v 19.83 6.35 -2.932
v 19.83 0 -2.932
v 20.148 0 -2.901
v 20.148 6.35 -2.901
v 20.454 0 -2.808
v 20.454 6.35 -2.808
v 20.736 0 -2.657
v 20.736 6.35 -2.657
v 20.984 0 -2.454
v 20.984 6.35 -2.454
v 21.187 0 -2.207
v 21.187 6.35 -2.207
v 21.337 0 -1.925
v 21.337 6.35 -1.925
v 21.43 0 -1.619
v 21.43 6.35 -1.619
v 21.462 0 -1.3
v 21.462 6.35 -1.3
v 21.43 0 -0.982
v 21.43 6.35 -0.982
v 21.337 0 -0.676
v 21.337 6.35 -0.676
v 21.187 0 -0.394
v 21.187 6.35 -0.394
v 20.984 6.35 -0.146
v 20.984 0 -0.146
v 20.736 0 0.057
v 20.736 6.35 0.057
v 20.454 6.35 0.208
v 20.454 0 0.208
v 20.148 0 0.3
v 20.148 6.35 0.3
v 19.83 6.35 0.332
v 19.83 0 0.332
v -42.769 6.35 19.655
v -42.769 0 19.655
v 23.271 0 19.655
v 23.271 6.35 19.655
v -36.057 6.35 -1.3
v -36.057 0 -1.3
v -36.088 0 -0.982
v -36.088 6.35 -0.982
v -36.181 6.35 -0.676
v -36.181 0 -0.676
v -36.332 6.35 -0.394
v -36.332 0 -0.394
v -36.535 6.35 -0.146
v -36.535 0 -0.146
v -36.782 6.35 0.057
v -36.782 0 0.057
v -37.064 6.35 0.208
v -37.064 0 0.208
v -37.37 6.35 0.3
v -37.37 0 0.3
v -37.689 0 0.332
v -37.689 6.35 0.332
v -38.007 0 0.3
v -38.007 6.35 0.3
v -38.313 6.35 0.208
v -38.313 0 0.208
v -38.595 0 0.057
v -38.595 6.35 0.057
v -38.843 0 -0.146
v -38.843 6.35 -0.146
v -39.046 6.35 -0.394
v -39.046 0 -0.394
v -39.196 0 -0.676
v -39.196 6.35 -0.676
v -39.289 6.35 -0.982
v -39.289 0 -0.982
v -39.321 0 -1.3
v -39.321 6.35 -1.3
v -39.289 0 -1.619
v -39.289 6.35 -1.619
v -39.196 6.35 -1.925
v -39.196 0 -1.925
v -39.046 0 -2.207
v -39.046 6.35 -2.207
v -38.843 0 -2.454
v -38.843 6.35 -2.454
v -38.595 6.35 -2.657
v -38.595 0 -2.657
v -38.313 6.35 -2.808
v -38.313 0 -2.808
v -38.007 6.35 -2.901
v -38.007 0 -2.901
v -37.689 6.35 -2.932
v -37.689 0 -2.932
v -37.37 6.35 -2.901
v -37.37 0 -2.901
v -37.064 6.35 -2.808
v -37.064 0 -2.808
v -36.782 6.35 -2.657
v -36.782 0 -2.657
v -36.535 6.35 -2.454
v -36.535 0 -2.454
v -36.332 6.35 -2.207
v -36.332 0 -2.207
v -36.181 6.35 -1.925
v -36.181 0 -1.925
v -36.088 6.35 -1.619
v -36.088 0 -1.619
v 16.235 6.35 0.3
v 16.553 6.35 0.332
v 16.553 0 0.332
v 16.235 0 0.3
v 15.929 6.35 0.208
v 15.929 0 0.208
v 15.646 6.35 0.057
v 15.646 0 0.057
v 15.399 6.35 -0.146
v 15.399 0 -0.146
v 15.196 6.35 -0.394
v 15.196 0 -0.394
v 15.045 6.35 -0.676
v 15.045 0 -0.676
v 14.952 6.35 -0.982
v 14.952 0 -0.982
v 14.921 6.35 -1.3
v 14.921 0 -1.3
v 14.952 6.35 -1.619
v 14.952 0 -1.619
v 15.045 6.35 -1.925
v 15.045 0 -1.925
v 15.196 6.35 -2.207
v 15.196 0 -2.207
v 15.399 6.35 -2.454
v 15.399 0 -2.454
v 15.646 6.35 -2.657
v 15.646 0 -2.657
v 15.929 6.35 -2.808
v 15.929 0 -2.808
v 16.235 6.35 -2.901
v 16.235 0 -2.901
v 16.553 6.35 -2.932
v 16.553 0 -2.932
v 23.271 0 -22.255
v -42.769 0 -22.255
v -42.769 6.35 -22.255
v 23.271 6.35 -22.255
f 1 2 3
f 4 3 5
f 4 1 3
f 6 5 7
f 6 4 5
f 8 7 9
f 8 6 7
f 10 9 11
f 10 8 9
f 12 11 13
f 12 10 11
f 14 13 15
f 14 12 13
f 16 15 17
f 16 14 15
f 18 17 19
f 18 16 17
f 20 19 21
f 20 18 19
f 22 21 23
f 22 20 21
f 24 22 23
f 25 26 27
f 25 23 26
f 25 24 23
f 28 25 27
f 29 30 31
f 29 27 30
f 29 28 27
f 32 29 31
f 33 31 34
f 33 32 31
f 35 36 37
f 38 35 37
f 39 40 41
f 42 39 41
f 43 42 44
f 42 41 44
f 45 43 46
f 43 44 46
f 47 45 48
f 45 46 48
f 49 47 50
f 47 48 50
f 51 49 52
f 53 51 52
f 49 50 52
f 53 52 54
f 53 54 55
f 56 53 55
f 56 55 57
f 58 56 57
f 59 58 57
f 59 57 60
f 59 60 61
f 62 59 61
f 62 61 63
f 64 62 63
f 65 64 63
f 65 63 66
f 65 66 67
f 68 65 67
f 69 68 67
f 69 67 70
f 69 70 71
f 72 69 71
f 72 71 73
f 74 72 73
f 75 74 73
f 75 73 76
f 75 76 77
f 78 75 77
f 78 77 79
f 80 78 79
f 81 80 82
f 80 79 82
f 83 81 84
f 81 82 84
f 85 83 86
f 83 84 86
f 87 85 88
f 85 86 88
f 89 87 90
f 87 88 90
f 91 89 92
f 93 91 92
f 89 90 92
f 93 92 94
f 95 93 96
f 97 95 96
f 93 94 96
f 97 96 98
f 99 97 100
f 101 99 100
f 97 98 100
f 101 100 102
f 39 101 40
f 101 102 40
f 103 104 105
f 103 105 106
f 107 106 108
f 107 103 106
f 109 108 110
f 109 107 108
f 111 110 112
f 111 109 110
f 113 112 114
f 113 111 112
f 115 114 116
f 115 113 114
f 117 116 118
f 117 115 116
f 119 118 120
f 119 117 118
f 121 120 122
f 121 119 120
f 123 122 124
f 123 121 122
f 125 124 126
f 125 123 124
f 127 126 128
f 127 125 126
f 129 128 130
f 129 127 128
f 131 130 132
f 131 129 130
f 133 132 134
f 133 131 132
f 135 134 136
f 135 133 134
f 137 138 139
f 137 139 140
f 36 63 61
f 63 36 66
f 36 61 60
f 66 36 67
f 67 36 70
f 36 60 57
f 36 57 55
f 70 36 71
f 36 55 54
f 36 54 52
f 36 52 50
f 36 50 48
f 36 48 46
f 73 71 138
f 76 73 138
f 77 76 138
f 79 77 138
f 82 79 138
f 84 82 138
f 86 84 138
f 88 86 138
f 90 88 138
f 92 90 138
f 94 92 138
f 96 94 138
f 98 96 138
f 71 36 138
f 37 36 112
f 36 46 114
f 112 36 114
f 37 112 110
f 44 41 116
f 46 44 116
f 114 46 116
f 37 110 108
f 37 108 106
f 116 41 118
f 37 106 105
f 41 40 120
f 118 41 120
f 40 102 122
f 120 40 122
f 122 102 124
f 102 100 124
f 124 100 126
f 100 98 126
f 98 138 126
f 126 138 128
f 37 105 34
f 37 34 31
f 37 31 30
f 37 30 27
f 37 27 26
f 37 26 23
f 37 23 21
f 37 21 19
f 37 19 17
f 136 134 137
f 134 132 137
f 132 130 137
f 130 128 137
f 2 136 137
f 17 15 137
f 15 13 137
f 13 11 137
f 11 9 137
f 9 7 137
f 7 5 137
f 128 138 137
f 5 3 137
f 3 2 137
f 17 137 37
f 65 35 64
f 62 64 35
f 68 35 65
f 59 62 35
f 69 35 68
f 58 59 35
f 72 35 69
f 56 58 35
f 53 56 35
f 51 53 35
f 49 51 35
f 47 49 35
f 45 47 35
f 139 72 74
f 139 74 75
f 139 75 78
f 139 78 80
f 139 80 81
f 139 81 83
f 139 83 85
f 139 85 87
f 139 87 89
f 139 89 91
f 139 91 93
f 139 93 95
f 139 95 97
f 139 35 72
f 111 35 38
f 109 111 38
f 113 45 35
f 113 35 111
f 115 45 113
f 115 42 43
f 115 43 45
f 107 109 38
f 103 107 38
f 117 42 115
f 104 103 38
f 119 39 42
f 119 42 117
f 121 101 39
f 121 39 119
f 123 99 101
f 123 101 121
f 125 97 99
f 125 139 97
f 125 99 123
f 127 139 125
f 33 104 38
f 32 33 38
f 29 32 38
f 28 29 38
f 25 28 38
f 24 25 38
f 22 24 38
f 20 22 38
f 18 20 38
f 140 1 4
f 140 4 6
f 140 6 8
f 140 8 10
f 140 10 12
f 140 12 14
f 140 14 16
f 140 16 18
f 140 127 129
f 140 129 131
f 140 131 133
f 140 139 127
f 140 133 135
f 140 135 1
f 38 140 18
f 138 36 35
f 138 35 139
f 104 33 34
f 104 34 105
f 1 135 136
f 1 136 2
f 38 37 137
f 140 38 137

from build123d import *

# Parameters (mm, degrees)
SKETCH1_W                 = 66.04
SKETCH1_H                 = 41.91
BOSS_EXTRUDE1_DEPTH       = 6.35
F_5_CLEARANCE_HOLE1_D     = 3.2639
F_5_CLEARANCE_HOLE1_DEPTH = 12.7
F_5_CLEARANCE_HOLE1_TIP   = 0.980574487
CUT_EXTRUDE1_REACH        = 8.35


with BuildPart() as part:
    # Sketch1 → Boss-Extrude1 (new body)
    with BuildSketch(Plane(origin=(0, 0, 0), x_dir=(1, 0, 0), z_dir=(0, 1, 0))):
        with Locations((-9.748619051, 1.300163759)):
            Rectangle(SKETCH1_W, SKETCH1_H)
    extrude(amount=BOSS_EXTRUDE1_DEPTH)

    # #5 Clearance Hole1
    with Locations(Plane(origin=(0, 6.35, 0), x_dir=(-1, 0, 0), z_dir=(0, 1, 0))):
        with Locations((37.688619051, -1.300163759)):
            Hole(F_5_CLEARANCE_HOLE1_D / 2, depth=F_5_CLEARANCE_HOLE1_DEPTH)
            with Locations((0, 0, -(F_5_CLEARANCE_HOLE1_DEPTH + F_5_CLEARANCE_HOLE1_TIP / 2))):  # 118° drill point
                Cone(0, F_5_CLEARANCE_HOLE1_D / 2, F_5_CLEARANCE_HOLE1_TIP, mode=Mode.SUBTRACT)

    # Sketch13 → Cut-Extrude1 (cut, up to next)
    with BuildSketch(Plane(origin=(0, 6.35, 0), x_dir=(1, 0, 0), z_dir=(0, 1, 0)), mode=Mode.PRIVATE) as cut_extrude1_sk1:
        with BuildLine():
            Line((19.829680949, -0.331786241), (16.553080949, -0.331786241))
            ThreePointArc((16.553080949, -0.331786241), (14.921130949, 1.300163759), (16.553080949, 2.932113759))
            Line((16.553080949, 2.932113759), (19.829680949, 2.932113759))
            ThreePointArc((19.829680949, 2.932113759), (21.461630949, 1.300163759), (19.829680949, -0.331786241))
        make_face()
    cut_extrude1_tool1 = extrude(cut_extrude1_sk1.sketch, amount=-CUT_EXTRUDE1_REACH, mode=Mode.PRIVATE) & part.part
    add(cut_extrude1_tool1.solids().sort_by_distance((18.191381, 6.35, -1.300164))[0], mode=Mode.SUBTRACT)


solid = part.part
